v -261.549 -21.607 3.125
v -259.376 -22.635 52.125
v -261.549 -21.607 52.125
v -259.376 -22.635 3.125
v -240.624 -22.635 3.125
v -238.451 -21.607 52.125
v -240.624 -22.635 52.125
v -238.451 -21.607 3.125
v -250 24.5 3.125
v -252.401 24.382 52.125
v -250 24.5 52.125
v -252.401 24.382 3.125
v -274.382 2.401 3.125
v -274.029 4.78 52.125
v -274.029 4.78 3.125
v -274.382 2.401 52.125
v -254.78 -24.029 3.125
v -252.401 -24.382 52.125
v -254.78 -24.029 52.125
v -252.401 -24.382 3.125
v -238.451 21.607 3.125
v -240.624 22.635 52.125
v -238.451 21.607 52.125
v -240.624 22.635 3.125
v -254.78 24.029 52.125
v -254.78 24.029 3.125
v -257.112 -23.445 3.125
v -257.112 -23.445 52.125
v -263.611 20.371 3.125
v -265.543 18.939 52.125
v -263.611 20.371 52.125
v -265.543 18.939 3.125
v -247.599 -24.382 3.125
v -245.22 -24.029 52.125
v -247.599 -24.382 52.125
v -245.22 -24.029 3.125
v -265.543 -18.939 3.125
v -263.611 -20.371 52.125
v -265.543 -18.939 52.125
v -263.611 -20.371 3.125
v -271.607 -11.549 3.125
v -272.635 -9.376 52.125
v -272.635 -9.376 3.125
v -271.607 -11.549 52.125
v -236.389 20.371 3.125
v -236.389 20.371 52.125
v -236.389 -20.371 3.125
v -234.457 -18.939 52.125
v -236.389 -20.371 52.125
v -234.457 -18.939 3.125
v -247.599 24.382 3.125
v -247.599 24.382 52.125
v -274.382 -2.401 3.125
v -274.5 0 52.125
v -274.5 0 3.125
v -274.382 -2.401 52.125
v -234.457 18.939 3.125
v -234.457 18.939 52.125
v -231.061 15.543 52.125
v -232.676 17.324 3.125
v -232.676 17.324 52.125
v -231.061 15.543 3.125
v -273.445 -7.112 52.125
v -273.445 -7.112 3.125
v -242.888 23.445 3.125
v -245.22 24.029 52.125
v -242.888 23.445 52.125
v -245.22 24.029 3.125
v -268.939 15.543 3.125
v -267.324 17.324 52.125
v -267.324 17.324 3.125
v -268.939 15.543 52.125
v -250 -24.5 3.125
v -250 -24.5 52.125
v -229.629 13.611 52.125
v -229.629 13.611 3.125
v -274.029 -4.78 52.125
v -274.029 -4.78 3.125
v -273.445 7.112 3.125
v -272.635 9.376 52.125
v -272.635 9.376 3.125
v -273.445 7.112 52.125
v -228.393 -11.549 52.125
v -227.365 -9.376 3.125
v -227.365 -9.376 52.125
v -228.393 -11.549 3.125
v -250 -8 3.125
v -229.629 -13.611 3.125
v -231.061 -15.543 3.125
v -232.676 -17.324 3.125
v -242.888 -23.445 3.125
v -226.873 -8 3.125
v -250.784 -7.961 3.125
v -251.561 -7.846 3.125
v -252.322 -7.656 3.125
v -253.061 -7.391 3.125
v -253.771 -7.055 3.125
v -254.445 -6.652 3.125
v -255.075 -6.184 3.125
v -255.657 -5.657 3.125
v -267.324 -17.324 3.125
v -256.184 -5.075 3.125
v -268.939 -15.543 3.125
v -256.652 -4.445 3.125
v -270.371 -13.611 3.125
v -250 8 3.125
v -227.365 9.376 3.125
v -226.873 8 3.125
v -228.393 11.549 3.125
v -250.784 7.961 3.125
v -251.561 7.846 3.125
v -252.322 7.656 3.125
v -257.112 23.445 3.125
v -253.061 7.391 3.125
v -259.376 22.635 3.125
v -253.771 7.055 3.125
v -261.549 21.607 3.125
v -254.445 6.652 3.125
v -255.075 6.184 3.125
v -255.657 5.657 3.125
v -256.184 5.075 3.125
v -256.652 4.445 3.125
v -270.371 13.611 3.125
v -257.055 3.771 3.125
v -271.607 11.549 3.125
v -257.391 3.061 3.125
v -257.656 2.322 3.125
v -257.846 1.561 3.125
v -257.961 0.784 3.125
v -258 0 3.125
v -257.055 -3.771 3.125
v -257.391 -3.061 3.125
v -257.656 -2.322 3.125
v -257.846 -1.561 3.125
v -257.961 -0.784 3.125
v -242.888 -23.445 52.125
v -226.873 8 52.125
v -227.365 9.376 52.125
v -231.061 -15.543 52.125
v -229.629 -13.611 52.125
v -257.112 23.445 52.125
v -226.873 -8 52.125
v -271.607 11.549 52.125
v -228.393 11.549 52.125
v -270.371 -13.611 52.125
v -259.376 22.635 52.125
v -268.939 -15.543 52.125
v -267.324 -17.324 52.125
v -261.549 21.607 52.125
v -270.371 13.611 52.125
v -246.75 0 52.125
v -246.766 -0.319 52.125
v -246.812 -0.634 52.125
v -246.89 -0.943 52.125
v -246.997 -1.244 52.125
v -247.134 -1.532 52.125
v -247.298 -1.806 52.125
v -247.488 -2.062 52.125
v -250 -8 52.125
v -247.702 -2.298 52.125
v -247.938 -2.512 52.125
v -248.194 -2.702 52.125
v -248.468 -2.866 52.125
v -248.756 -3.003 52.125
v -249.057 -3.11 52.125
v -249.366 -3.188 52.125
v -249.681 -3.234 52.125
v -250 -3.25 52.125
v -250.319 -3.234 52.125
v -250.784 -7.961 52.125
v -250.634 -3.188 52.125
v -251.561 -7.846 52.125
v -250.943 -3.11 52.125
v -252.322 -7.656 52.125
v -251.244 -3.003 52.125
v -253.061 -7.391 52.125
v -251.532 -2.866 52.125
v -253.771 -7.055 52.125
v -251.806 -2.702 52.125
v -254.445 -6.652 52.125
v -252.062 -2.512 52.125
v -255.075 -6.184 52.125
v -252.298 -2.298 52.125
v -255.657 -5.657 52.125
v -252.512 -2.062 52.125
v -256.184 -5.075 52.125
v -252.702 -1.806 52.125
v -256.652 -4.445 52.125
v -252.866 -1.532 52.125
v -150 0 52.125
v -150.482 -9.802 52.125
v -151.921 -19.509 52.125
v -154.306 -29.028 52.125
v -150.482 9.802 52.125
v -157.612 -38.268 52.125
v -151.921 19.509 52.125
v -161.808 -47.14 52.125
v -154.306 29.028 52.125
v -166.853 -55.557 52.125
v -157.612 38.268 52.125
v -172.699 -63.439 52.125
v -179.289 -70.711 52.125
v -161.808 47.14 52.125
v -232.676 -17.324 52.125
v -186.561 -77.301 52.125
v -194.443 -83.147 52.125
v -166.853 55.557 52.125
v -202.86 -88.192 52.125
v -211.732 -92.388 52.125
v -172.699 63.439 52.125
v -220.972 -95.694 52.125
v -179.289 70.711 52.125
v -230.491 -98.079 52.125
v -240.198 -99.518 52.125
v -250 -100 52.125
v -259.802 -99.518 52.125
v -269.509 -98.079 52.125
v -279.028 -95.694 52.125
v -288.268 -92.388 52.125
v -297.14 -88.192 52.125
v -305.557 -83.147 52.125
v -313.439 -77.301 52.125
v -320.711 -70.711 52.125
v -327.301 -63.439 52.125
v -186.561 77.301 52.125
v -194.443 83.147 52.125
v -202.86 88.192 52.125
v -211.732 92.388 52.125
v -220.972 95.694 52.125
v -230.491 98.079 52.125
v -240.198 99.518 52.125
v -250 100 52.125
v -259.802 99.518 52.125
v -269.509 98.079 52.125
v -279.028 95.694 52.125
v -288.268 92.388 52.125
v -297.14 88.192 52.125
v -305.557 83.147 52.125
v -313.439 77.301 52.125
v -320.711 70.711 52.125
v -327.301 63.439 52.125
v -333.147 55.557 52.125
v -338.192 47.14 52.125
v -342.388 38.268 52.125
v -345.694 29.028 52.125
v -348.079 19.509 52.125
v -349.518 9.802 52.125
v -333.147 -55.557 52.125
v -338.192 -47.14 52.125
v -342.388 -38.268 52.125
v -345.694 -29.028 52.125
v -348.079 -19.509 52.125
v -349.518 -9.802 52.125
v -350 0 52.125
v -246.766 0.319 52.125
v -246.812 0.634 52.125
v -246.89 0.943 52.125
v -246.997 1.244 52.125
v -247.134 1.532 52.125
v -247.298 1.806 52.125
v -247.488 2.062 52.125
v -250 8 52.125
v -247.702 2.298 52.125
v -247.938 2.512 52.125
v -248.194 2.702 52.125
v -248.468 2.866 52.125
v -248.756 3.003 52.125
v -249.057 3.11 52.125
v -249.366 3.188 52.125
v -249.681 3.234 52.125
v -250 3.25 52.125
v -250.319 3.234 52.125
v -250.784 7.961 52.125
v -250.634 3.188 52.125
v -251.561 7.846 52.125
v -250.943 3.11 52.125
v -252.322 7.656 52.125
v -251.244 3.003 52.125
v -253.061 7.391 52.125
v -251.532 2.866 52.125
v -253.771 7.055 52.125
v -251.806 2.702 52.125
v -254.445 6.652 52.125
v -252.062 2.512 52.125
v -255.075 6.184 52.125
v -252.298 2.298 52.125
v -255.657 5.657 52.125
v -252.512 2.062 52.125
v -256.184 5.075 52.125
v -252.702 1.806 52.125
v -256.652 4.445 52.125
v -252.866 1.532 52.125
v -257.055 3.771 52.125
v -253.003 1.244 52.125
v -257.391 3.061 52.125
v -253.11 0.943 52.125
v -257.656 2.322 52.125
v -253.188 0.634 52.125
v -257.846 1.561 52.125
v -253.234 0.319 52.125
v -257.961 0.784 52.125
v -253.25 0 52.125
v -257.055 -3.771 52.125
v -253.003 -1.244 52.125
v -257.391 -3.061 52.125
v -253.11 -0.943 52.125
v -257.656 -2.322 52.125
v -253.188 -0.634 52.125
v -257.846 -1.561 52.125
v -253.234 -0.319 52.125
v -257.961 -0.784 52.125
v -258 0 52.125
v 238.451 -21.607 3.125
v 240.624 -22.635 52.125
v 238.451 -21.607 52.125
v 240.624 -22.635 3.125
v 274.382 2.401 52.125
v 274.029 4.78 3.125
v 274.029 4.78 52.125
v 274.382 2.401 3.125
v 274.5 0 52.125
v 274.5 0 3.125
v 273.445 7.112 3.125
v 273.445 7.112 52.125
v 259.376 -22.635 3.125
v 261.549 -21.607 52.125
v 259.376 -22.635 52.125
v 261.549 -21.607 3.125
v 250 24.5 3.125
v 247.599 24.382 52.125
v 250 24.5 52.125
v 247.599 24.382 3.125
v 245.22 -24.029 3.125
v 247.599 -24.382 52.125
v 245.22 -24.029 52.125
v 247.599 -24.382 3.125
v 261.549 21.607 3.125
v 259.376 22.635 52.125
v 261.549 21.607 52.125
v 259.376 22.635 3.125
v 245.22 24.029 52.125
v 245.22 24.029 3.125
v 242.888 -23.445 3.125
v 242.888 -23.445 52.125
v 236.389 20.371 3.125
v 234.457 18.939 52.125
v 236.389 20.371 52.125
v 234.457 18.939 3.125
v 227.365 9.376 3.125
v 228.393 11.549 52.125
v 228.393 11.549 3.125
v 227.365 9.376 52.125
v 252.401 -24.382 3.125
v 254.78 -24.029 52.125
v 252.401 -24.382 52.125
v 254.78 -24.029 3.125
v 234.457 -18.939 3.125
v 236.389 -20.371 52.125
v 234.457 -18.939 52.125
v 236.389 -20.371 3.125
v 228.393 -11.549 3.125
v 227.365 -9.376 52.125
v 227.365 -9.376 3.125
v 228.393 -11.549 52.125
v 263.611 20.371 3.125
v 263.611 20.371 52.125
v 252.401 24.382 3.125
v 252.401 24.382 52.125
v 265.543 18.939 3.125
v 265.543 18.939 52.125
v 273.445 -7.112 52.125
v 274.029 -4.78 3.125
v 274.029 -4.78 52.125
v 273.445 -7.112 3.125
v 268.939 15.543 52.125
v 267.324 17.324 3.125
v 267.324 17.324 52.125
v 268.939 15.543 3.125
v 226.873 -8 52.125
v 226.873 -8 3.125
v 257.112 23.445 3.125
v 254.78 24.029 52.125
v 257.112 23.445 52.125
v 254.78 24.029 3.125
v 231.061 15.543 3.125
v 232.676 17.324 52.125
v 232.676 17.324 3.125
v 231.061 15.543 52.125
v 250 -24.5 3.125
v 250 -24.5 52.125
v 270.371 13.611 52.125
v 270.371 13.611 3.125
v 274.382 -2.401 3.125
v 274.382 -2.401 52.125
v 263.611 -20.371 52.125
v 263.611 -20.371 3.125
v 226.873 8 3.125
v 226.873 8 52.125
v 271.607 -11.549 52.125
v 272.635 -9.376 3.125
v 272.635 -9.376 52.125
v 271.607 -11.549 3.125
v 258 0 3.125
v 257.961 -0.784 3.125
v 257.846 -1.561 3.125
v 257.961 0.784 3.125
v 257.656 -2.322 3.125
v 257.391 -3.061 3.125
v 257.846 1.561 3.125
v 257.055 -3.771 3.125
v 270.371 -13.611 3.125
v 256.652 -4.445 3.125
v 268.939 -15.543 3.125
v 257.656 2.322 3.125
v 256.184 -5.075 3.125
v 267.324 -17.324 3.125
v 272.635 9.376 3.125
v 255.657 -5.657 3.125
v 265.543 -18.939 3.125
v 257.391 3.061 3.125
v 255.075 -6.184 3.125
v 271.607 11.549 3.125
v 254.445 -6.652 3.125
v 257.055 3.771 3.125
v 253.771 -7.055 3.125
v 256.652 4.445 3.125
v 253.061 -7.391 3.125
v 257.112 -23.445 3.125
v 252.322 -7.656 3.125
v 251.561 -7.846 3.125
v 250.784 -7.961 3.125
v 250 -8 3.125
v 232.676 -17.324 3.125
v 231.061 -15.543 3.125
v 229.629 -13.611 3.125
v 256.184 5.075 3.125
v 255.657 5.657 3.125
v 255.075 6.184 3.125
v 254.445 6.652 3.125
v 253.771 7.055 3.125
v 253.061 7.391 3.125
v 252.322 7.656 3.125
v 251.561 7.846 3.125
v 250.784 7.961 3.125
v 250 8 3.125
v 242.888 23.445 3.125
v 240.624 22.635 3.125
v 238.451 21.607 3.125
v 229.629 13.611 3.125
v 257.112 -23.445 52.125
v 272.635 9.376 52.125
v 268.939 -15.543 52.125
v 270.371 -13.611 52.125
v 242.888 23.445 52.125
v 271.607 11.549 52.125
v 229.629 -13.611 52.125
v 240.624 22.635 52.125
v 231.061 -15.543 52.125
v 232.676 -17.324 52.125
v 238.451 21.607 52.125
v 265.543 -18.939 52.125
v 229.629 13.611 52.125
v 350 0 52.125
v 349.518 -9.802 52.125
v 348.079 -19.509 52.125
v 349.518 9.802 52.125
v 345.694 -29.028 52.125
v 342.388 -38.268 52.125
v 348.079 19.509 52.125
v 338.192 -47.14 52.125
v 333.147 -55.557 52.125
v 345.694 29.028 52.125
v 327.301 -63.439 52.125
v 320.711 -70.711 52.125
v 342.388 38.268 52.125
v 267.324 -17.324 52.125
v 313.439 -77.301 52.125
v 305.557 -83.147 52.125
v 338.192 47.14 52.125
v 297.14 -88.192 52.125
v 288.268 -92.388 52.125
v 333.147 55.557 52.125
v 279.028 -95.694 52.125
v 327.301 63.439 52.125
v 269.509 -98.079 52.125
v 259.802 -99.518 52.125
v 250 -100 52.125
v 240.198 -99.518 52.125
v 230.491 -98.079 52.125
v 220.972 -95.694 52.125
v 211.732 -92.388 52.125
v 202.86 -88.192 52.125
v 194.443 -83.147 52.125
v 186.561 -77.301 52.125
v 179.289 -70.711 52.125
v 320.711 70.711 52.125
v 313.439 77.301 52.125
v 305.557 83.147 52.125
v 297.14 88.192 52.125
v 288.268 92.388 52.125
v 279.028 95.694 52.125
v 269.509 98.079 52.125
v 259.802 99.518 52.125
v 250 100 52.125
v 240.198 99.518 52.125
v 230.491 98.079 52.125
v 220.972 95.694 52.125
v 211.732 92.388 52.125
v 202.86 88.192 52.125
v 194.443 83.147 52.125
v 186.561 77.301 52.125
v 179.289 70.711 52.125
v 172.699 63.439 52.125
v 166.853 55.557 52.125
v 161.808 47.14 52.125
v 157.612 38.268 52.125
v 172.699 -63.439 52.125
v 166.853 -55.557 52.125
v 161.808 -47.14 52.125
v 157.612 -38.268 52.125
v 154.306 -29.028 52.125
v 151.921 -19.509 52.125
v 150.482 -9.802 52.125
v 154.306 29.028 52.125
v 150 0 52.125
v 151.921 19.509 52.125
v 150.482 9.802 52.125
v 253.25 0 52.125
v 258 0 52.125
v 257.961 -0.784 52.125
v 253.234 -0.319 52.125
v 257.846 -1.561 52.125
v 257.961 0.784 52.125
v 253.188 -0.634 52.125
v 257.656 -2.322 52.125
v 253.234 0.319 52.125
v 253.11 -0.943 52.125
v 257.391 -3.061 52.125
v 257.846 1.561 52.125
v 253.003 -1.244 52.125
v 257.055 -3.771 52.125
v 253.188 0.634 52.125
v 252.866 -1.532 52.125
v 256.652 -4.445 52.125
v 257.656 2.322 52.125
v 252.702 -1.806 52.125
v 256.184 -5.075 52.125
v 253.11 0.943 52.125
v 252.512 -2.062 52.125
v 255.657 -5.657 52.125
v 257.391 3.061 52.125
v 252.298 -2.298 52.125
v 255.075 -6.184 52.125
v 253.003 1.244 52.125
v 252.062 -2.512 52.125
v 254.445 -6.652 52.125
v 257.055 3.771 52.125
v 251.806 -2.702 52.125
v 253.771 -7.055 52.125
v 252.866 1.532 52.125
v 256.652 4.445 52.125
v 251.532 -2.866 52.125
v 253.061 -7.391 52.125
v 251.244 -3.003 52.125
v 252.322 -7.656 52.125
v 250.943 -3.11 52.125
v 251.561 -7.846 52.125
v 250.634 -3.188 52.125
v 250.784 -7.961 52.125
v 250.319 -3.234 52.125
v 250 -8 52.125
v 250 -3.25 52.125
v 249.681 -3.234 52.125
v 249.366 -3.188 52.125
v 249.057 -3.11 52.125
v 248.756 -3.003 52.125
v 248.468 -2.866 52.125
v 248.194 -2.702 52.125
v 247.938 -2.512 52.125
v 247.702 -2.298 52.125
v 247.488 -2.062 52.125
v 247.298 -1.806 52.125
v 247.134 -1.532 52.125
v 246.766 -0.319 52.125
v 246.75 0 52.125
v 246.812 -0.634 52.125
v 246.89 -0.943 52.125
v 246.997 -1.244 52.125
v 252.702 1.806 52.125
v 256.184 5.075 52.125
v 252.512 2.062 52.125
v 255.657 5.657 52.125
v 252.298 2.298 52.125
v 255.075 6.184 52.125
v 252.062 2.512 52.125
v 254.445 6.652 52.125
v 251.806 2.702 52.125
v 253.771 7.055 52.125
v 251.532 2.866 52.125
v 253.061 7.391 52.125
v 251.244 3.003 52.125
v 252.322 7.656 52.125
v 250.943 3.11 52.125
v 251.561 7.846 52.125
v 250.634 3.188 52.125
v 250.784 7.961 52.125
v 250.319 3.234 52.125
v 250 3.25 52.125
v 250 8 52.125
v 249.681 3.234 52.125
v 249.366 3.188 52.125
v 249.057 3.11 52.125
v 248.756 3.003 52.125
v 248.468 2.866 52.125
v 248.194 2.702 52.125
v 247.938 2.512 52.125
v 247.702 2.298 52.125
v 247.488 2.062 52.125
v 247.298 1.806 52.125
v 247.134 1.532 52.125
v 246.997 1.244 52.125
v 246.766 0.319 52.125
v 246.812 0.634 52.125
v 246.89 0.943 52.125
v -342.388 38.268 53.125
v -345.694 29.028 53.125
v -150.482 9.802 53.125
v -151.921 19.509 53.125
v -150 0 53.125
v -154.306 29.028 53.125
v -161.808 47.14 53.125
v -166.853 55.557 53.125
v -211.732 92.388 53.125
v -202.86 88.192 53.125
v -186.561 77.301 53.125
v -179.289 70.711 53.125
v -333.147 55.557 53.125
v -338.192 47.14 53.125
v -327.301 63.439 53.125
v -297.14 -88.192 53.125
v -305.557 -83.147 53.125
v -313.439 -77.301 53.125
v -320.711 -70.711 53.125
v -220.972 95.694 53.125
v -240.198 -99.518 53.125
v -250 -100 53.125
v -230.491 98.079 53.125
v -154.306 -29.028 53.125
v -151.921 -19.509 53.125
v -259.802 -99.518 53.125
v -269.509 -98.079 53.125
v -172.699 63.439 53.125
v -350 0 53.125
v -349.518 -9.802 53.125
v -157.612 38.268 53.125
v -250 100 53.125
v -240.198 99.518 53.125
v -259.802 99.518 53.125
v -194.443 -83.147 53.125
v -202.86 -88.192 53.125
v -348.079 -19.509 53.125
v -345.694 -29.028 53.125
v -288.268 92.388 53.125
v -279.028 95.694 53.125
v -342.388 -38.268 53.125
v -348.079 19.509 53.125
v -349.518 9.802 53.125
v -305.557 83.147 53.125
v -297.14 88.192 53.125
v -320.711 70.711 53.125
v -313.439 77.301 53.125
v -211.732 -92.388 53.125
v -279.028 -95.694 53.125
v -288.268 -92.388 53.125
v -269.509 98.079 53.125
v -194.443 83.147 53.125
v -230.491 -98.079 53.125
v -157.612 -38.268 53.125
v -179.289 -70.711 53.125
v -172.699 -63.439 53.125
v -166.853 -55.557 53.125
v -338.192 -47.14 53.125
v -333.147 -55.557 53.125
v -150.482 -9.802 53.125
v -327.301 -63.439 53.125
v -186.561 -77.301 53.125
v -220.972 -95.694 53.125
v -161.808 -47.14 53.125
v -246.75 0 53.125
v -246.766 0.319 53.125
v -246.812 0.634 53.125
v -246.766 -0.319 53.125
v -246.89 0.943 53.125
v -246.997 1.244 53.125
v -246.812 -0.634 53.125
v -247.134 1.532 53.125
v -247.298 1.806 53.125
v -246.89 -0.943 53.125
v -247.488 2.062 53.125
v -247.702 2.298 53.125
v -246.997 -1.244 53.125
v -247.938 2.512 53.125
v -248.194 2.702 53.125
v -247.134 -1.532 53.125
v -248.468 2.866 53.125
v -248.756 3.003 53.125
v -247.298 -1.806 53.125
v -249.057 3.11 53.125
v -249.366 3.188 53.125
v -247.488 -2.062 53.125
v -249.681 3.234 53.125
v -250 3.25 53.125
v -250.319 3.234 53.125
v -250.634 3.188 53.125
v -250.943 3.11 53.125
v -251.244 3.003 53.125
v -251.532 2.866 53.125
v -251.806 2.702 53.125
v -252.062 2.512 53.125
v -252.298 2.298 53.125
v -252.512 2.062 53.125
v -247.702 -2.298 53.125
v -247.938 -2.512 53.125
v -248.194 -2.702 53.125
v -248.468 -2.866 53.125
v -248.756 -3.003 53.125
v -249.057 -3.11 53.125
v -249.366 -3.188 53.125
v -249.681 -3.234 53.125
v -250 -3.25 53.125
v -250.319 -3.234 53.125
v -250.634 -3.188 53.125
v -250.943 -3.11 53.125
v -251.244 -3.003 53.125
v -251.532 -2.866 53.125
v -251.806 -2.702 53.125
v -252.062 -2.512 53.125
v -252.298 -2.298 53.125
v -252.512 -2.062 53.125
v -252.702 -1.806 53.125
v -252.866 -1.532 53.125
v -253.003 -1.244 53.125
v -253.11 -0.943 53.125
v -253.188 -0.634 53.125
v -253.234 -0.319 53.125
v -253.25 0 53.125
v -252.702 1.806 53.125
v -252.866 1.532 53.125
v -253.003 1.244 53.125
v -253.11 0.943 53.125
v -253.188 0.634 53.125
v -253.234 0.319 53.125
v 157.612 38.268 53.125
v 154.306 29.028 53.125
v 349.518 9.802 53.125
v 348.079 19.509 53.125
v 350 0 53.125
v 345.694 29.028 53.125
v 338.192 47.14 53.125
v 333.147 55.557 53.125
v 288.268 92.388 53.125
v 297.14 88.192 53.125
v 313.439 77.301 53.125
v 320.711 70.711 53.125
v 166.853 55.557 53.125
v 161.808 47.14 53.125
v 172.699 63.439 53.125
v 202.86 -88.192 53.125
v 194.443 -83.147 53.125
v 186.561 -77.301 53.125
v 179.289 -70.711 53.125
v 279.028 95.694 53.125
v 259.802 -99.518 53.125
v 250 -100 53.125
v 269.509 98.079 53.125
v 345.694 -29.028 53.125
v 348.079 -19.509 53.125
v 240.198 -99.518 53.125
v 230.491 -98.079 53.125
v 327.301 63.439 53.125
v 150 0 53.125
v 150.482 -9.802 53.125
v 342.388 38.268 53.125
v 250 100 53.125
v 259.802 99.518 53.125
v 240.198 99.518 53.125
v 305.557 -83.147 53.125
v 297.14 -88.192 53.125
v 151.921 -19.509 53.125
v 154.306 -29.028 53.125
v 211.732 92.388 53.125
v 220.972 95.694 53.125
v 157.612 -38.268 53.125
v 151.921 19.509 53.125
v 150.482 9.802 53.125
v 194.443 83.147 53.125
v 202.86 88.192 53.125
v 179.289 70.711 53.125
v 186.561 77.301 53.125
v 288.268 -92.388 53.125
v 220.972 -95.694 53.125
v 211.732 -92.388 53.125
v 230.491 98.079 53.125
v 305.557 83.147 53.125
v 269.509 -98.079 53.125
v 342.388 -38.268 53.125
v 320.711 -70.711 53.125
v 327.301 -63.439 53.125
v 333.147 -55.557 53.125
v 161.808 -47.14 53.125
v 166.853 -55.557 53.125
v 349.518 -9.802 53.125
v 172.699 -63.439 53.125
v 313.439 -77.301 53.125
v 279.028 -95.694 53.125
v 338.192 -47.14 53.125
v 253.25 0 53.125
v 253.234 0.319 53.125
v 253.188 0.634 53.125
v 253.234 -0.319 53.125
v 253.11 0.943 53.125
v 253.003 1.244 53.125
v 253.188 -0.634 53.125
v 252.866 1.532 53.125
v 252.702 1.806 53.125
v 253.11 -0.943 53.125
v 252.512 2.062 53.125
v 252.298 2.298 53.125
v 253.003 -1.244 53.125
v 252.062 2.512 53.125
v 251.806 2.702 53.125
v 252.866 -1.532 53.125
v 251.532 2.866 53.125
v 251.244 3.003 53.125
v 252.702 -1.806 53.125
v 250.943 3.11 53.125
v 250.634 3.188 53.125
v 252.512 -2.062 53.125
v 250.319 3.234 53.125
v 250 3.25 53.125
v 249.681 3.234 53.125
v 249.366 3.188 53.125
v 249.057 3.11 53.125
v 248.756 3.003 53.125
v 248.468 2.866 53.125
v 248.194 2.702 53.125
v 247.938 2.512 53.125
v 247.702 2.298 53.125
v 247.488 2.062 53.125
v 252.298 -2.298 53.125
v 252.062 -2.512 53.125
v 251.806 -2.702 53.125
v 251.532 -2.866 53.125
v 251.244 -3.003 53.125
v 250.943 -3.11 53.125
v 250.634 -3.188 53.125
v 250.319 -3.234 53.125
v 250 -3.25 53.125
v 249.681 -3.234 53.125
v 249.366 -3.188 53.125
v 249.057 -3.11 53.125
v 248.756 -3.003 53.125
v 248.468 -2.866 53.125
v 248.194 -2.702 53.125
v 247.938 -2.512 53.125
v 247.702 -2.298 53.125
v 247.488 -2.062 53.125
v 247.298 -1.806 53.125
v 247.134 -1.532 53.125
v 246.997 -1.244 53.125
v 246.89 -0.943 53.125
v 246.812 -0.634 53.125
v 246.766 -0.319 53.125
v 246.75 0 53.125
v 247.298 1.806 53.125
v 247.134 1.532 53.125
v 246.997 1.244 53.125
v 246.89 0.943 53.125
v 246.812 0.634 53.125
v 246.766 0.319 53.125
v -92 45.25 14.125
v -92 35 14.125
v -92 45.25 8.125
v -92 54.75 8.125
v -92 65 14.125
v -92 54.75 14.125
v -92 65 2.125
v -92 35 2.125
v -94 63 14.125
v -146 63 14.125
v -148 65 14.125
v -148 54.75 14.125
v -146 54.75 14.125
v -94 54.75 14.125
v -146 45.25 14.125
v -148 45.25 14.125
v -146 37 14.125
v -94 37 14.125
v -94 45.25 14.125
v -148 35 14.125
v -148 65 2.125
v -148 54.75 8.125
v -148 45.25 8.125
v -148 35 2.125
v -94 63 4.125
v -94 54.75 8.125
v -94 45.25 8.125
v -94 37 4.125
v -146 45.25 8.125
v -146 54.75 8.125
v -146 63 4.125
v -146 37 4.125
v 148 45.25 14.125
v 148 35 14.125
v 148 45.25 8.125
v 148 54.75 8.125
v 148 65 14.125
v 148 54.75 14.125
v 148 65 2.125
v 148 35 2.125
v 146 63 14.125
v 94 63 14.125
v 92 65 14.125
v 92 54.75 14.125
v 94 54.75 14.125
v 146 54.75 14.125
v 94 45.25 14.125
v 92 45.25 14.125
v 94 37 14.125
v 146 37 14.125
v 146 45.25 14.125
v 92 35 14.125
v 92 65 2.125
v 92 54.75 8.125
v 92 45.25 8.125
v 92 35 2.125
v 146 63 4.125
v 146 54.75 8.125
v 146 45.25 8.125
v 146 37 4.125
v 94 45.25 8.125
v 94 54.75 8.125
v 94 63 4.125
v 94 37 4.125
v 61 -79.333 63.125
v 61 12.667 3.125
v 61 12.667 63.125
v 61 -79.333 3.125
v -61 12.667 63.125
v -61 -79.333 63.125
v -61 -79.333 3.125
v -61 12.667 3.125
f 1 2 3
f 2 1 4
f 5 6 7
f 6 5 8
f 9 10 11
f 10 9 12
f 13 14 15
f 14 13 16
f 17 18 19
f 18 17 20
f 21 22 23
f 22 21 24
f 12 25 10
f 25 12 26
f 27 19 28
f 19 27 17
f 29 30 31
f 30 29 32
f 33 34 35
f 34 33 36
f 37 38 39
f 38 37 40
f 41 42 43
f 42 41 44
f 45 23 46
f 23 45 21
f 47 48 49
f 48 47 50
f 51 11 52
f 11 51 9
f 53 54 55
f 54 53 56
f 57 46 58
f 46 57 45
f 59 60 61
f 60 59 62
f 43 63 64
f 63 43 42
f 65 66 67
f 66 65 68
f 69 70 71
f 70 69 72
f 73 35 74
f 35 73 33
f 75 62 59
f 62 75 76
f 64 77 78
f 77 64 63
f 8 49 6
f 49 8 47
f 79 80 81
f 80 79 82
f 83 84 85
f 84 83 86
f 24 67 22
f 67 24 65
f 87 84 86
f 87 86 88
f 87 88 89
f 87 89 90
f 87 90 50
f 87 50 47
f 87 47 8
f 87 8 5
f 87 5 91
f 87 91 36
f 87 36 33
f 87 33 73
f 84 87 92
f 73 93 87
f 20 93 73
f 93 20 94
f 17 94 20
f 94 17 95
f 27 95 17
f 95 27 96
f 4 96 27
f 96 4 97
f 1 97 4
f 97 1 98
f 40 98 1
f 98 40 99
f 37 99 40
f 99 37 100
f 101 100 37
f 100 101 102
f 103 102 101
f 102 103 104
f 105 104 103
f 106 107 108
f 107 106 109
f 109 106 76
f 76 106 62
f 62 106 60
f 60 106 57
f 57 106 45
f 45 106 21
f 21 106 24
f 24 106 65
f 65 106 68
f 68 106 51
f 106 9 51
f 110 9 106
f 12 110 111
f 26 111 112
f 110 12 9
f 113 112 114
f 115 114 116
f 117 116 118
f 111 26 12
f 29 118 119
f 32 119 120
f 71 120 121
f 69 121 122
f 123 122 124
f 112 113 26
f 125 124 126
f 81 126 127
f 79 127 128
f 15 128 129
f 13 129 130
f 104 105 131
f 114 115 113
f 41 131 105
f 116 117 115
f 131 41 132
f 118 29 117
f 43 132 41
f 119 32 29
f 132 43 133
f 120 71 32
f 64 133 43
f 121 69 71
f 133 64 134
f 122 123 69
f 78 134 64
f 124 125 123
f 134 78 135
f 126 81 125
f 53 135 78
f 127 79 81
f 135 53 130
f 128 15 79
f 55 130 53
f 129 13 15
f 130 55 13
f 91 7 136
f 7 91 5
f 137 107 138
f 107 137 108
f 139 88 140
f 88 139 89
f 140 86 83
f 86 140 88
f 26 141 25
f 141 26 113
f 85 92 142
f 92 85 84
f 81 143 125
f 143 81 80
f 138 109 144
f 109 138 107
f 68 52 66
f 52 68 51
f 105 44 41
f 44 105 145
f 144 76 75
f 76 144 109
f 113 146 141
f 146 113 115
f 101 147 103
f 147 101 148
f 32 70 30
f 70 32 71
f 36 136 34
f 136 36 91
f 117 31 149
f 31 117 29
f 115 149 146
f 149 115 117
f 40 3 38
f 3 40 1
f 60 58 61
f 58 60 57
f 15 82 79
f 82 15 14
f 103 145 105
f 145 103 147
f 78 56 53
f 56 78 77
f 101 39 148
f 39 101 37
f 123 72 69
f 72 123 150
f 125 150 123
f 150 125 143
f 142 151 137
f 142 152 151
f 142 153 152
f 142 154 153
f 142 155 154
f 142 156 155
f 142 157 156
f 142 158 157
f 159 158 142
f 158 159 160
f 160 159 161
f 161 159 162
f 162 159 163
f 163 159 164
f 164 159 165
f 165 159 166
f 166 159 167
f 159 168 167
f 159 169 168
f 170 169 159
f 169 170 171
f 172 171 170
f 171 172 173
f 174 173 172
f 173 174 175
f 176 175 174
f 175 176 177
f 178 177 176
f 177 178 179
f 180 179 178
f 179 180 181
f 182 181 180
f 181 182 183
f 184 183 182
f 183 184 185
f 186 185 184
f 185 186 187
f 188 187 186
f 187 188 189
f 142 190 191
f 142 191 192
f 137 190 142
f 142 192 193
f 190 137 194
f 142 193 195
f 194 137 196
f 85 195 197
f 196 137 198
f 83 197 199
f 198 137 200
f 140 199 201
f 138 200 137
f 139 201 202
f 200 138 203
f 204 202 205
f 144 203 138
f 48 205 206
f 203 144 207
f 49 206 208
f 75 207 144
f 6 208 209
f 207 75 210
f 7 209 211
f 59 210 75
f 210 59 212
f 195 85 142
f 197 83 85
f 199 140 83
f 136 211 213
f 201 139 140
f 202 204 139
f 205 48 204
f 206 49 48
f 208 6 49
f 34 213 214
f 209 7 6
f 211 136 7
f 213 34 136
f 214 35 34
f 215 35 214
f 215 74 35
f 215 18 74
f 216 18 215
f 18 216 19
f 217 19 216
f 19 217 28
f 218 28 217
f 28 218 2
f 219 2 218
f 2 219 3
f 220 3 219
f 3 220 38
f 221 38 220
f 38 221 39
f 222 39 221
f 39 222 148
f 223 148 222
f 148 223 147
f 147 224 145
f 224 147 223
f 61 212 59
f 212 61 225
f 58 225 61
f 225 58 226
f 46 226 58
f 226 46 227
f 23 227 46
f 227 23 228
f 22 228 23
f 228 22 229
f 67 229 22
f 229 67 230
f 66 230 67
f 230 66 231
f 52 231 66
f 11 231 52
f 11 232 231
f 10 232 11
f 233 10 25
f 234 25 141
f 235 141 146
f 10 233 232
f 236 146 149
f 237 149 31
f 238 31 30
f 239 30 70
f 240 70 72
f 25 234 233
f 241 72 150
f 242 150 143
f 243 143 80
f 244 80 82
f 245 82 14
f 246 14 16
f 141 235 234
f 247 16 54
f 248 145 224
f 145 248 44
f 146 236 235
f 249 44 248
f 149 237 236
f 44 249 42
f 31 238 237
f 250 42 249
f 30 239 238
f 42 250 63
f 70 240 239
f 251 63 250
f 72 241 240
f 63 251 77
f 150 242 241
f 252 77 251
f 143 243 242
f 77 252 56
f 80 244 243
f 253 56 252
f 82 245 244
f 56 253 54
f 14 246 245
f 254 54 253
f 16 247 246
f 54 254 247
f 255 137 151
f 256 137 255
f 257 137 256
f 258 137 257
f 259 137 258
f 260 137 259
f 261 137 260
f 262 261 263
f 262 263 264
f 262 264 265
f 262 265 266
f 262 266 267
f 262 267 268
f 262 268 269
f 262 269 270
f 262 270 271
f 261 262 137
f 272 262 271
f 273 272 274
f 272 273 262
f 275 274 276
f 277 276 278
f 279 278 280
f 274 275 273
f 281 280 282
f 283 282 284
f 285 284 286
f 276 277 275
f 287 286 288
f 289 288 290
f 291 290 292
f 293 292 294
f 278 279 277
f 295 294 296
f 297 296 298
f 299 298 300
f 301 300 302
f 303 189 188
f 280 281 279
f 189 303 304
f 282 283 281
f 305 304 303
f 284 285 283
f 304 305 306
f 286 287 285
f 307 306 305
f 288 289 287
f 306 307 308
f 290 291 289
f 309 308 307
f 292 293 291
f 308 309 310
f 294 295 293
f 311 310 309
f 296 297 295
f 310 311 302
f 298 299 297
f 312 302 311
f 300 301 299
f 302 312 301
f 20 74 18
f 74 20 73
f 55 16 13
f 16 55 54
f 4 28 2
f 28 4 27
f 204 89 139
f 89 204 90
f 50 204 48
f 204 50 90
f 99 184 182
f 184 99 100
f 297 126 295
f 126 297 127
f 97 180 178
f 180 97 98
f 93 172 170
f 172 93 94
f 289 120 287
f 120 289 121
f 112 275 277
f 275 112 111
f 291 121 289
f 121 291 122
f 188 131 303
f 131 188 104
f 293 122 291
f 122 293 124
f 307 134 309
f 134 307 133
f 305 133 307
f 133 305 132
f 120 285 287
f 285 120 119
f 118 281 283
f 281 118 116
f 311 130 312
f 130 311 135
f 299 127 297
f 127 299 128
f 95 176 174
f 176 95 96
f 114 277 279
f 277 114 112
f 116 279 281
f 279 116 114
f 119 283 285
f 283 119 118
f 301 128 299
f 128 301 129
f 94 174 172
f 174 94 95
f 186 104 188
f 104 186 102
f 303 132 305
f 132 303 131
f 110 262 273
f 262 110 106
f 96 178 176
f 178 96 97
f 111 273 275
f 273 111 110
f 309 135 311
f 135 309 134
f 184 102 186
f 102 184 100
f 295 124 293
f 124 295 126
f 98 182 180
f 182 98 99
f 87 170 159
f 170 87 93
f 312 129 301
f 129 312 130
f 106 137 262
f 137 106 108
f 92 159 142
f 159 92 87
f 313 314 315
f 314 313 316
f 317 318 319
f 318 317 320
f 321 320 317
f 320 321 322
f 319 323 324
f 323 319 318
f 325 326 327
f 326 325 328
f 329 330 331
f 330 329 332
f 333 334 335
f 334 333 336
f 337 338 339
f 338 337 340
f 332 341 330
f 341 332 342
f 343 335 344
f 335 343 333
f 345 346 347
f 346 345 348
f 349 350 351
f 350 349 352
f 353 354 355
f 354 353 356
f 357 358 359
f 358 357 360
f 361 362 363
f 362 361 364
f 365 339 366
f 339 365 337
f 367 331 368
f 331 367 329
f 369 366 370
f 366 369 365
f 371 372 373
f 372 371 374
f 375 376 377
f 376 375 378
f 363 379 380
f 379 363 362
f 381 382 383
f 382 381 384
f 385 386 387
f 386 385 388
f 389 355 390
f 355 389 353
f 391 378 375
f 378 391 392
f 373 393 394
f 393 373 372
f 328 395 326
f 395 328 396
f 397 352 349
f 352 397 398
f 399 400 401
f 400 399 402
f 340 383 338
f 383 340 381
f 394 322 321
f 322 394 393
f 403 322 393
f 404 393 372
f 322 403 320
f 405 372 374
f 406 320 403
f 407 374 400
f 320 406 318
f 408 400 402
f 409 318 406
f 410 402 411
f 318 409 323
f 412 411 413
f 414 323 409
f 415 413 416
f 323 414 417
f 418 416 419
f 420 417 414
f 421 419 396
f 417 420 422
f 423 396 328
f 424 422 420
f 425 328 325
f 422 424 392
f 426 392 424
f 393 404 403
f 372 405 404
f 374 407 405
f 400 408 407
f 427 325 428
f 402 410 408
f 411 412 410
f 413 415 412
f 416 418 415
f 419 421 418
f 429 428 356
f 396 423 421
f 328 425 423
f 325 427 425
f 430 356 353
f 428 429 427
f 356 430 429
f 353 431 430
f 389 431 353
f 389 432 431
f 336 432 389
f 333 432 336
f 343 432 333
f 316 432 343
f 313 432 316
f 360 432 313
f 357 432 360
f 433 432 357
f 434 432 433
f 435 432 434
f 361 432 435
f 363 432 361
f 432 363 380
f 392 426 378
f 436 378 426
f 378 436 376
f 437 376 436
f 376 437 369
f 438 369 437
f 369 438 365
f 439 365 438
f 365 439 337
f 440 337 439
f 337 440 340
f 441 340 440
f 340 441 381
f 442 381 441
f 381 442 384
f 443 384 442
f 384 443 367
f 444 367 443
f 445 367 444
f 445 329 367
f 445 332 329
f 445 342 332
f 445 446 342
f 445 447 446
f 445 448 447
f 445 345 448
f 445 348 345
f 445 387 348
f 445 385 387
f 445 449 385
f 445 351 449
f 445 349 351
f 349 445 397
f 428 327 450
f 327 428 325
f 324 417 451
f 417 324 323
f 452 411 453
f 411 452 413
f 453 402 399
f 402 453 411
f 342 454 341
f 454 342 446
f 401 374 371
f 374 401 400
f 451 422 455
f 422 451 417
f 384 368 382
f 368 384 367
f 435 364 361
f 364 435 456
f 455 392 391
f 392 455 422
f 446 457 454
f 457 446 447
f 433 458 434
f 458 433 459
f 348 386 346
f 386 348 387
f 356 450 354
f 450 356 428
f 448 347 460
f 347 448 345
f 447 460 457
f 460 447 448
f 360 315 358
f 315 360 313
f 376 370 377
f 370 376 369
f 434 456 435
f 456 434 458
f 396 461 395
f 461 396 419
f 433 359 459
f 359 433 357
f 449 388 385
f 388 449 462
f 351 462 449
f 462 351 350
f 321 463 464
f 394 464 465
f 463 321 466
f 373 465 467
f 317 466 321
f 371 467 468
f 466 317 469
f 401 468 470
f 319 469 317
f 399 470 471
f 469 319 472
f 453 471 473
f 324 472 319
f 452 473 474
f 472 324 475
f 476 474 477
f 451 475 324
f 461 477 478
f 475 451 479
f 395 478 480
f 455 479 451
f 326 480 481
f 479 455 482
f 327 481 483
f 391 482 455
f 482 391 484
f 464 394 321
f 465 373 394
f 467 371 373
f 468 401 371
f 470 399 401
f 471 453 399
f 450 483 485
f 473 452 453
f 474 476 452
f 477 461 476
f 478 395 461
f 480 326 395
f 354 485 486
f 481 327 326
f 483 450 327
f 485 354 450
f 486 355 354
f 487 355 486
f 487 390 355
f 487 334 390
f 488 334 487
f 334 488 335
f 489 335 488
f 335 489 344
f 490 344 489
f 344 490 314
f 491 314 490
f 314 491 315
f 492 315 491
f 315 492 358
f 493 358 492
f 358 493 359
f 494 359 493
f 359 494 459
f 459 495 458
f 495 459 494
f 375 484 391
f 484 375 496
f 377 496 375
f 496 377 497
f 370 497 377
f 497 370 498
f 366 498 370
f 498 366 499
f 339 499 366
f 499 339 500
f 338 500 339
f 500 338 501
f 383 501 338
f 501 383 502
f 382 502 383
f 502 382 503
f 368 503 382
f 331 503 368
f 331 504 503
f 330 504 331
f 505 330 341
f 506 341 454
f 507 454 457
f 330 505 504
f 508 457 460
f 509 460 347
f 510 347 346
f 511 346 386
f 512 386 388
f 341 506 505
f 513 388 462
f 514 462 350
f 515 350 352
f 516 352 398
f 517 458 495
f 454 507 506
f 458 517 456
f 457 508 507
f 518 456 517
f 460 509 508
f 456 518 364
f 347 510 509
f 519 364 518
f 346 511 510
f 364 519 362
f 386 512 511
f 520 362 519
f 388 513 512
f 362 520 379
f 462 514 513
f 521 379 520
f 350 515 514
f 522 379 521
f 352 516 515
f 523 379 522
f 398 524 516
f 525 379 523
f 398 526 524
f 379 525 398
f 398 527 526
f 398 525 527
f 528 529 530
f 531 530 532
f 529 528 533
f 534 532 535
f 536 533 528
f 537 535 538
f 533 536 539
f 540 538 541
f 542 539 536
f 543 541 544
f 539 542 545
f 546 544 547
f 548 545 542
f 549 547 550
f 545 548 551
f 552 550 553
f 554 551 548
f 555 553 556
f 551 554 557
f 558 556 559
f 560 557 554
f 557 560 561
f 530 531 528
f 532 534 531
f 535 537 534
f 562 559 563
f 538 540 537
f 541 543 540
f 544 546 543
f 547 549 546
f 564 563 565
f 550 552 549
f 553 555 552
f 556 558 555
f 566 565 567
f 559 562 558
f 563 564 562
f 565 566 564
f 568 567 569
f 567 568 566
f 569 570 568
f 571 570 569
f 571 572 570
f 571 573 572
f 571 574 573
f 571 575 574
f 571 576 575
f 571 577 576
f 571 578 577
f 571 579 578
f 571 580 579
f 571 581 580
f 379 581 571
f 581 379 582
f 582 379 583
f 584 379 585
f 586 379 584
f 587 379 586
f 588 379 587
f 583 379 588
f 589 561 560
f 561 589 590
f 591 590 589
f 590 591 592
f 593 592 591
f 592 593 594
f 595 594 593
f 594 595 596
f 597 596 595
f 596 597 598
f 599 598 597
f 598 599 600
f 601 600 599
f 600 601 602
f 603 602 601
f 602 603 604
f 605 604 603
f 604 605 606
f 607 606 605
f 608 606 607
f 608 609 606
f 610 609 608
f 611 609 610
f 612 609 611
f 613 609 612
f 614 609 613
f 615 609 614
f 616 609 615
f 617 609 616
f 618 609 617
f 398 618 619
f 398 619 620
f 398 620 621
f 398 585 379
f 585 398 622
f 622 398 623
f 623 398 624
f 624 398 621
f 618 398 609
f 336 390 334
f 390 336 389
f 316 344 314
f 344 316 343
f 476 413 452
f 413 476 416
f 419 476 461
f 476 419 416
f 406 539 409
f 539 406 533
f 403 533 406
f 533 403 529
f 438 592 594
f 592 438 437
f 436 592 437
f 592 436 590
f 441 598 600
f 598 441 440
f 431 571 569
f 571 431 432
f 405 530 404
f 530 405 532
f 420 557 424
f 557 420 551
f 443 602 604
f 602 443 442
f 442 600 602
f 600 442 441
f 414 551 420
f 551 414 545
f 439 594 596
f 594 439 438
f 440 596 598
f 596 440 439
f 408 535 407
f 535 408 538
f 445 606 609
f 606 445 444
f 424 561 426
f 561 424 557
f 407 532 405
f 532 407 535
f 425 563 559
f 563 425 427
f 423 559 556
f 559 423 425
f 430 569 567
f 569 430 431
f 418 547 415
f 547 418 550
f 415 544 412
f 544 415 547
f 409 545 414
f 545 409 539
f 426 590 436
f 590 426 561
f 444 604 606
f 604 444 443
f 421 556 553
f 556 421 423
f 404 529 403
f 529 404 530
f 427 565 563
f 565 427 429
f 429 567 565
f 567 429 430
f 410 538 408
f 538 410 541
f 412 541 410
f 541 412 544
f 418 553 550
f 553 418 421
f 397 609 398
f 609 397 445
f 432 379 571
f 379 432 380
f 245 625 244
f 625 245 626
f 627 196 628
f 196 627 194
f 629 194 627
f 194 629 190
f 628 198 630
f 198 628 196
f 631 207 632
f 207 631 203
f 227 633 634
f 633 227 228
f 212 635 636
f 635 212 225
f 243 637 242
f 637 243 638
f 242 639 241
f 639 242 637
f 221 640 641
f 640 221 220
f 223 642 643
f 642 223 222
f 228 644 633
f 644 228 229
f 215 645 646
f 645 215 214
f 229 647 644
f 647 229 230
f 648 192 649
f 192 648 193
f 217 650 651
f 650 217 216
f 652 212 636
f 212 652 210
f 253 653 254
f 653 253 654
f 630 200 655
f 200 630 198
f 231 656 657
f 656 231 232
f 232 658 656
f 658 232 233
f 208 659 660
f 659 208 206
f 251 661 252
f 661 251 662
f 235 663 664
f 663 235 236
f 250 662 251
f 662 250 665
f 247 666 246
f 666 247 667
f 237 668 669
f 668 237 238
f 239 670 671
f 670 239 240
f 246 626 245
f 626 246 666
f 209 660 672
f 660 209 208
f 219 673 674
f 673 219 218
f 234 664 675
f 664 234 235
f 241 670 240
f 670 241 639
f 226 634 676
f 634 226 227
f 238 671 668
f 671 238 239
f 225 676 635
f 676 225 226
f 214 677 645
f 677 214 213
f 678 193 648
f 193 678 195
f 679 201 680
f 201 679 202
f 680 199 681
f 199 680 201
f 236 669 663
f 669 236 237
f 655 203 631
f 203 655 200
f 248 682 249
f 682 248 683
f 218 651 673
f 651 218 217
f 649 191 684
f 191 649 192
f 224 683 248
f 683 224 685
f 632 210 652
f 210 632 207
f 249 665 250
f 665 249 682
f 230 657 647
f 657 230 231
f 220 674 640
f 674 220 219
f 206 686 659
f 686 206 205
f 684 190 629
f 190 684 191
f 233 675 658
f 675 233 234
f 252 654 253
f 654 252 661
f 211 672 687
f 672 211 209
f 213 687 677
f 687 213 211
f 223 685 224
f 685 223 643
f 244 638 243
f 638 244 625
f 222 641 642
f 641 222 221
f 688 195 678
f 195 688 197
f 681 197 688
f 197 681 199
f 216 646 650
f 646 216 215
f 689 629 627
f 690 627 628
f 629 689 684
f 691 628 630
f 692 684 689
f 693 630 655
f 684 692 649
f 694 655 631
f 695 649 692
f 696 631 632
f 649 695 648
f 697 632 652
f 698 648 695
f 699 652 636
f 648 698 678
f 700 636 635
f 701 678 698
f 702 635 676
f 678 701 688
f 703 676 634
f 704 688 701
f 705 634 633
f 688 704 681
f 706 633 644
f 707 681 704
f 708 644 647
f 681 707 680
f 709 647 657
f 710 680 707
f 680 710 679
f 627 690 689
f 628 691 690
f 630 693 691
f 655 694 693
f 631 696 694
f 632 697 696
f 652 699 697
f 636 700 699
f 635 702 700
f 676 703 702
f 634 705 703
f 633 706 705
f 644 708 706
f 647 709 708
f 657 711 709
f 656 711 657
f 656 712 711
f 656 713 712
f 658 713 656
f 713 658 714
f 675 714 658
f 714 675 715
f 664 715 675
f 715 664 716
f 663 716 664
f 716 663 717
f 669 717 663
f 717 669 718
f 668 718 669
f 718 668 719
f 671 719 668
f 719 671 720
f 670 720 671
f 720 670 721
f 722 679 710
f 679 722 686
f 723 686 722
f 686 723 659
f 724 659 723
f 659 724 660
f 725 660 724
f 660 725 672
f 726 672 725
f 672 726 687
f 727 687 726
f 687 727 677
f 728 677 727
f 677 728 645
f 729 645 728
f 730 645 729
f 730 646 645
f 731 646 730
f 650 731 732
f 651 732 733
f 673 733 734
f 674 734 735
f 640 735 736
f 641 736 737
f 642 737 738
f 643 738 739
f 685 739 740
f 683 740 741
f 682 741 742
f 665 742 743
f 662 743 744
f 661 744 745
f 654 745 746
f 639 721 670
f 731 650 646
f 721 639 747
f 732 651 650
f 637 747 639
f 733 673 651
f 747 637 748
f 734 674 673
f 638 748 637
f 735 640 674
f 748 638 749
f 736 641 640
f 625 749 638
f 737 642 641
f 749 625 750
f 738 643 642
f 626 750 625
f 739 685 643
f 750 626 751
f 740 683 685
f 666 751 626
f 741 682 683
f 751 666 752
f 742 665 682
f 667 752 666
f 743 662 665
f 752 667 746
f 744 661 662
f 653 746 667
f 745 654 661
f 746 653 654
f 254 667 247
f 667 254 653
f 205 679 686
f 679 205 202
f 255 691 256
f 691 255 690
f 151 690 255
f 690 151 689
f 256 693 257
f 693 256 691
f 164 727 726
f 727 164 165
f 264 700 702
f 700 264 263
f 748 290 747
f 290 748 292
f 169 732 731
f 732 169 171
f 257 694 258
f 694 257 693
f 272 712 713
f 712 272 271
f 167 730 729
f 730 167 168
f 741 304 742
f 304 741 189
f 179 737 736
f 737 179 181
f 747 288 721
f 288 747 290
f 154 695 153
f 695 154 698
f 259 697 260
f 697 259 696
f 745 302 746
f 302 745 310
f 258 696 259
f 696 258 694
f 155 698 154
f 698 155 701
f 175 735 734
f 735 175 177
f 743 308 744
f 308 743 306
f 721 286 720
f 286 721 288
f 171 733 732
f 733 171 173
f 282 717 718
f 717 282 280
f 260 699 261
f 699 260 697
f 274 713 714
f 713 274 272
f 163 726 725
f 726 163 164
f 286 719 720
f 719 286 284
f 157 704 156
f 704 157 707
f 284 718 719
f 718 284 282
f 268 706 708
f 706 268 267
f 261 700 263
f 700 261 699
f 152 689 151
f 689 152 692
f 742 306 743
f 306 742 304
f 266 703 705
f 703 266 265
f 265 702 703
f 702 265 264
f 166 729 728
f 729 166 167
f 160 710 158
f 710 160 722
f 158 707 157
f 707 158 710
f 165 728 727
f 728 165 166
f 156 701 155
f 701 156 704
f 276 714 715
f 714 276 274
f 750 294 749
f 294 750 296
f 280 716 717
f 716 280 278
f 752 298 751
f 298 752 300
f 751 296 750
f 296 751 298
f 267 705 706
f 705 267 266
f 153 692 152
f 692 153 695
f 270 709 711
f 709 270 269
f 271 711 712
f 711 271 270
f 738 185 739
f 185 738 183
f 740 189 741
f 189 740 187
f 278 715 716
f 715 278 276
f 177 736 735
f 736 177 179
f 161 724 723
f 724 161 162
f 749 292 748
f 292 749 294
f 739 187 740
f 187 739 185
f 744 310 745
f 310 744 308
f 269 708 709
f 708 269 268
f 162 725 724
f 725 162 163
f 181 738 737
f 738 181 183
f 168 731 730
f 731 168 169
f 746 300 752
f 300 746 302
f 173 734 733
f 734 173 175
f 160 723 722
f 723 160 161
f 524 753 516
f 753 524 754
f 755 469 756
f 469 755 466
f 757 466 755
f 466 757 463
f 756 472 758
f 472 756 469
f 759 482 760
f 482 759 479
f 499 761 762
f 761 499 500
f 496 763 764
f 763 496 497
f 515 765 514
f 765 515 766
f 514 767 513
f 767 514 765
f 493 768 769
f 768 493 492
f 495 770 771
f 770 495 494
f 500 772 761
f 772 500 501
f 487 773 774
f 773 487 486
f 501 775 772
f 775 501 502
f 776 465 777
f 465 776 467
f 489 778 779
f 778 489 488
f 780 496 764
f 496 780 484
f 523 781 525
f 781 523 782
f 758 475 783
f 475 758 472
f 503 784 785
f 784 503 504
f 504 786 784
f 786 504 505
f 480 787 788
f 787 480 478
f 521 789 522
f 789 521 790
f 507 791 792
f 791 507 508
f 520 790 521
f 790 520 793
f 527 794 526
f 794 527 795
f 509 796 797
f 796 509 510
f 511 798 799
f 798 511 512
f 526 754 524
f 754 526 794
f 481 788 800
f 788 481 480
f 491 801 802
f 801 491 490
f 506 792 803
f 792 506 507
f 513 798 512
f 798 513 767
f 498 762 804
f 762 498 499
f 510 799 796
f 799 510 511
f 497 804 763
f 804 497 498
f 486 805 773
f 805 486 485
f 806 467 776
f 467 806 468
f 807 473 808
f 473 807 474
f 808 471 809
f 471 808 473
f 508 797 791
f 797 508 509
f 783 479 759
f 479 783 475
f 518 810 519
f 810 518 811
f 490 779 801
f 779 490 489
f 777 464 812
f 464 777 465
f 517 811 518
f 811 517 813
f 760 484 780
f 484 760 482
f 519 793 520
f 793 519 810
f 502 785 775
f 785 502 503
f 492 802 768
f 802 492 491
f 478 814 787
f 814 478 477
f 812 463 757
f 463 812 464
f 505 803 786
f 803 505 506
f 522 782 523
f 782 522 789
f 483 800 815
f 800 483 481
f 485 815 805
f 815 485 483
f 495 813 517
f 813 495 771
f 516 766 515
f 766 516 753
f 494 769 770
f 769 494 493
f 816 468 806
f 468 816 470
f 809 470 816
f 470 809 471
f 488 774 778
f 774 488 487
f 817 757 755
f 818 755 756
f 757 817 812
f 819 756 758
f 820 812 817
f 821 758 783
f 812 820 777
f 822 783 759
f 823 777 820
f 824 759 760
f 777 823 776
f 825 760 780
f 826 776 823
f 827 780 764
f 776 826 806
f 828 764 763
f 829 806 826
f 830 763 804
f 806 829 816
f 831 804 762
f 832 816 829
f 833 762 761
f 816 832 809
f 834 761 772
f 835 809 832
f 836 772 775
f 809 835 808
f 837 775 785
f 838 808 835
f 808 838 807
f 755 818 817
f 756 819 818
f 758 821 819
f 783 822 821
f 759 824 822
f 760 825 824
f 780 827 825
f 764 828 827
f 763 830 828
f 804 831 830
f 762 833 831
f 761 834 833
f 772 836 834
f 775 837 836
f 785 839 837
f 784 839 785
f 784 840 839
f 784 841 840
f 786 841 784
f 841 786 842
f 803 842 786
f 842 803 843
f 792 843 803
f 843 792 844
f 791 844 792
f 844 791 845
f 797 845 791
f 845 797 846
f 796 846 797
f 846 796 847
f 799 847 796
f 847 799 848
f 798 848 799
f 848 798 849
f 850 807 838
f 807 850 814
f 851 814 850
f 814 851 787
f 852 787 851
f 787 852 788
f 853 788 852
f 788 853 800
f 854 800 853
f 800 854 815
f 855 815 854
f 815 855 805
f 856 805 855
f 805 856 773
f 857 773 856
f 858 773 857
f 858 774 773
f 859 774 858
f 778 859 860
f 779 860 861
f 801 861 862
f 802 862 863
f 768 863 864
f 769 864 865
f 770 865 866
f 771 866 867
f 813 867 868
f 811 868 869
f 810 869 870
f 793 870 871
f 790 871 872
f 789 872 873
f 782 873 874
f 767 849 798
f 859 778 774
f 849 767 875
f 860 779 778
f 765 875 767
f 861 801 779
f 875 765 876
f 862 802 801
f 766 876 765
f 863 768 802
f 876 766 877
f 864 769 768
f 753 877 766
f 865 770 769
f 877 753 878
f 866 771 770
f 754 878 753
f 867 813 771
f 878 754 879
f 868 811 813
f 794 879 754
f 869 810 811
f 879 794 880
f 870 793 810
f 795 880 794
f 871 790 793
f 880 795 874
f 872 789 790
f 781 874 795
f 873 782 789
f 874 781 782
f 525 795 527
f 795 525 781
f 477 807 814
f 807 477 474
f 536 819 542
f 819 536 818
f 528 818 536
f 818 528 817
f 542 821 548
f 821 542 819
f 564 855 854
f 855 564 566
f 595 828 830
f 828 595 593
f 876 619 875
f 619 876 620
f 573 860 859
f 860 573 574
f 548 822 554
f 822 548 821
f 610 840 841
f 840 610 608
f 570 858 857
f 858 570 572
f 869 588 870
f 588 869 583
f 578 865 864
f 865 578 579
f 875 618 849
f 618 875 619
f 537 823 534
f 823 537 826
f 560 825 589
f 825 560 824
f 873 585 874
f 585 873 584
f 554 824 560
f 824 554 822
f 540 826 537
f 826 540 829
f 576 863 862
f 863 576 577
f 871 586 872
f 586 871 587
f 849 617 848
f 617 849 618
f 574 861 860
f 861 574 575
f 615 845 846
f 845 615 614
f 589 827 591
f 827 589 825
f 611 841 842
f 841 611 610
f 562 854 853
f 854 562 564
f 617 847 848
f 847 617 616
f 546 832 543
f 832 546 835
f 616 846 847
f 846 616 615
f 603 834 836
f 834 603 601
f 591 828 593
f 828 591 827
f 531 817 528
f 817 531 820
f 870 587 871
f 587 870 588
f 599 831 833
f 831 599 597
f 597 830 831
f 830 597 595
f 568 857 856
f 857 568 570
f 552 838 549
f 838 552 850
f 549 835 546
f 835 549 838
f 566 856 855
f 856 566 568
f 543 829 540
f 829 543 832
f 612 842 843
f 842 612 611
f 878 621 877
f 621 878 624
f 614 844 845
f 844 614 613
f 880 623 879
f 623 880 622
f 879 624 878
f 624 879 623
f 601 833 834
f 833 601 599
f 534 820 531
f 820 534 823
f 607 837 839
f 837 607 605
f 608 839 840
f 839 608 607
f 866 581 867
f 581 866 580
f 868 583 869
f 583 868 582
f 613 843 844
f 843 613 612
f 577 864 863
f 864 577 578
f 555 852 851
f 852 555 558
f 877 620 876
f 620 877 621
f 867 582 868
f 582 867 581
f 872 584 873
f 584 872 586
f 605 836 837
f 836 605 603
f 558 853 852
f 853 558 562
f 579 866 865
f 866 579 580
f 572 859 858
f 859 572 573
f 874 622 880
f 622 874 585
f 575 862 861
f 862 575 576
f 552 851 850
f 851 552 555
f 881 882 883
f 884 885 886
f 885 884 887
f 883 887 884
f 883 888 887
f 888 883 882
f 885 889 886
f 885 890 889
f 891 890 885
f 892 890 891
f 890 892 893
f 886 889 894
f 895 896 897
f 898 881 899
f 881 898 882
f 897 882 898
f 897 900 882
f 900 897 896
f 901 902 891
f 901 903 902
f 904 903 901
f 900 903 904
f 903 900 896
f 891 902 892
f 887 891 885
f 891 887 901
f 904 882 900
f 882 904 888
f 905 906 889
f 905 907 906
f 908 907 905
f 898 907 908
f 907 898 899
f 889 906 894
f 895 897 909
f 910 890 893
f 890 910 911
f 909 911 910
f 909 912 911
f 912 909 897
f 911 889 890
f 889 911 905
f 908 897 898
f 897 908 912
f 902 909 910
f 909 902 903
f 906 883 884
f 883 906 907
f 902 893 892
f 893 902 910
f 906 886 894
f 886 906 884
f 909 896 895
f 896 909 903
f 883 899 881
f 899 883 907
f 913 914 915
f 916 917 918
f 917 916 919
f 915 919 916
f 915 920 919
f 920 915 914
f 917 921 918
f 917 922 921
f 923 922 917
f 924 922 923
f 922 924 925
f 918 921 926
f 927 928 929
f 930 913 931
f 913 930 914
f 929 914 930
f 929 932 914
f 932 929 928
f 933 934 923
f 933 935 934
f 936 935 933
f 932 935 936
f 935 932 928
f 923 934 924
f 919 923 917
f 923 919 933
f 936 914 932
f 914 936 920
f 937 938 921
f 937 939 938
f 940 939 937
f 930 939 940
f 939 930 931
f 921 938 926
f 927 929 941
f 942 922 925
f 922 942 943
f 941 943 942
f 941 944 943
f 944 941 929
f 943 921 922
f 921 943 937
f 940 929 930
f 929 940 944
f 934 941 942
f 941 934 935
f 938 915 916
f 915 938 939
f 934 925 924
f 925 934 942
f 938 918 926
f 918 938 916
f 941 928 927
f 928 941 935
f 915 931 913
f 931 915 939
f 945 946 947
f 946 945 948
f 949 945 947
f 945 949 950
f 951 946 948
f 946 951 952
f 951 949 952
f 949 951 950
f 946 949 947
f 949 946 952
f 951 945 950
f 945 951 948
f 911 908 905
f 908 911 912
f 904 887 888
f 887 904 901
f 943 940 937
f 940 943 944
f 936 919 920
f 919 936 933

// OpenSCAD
// Sending Stones Model Railroad Layout
// ------------------------------------
// Abraxas3d
// units are in mm


// ------------------------------------
// Parameters
// ------------------------------------

//make curves nice
$fn = 64;

// base layer dimensions
base_width = 700;
base_depth = 200;
base_height = 6.25; // quarter inch acrylic sheet

// X728 box dimensions (approximate)
x728_width = 122;
x728_depth = 92;
x728_height = 60;
    
// Ground plane and donut stand dimensions
ground_plane_radius = 100; //~quarter wave ground plane
ground_plane_height = 1; // 1 mm aluminum plate
donut_height = 2*24.5; //one inch height increments
donut_radius = 24.5; //one inch radius
donut_hole_radius = 8; // 16 mm clearance for SMA bulkhead connector in donut
sma_hole_radius = 6.5/2; // 6.5 mm hole for SMA connector

// Heltec v3 case dimensions
heltec_width = 56;
heltec_depth = 30;
heltec_height = 11;
heltec_wall = 2;
usb_width = 9.5;
usb_height = 4;
usb_sill = 5;

// ------------------------------------
// Components Defined
// ------------------------------------

// the base layer
//cube([base_width, base_depth , base_height], center = true);

// X728
translate([0, -base_depth/6, base_height/2 + x728_height/2])
    {
    cube([x728_width, x728_depth, x728_height], center = true);
    };

// Ground plane donut hole mounts with cable cutout
translate([-250, 0, base_height/2 + donut_height/2])
    {
    difference()
        {
        cylinder(donut_height, donut_radius, donut_radius, center = true); //donut
        cylinder(donut_height, donut_hole_radius, donut_hole_radius, center = true); //hole
        translate([donut_radius/2, 0, 0])
            {
            cube([donut_radius, donut_hole_radius*2, donut_height], center = true); //channel out
            };
        };
    };
    
translate([250, 0, base_height/2 + donut_height/2])
    {
    difference()
        {
        cylinder(donut_height, donut_radius, donut_radius, center = true);
        cylinder(donut_height, donut_hole_radius, donut_hole_radius, center = true);
        translate([-donut_radius/2, 0, 0])
            {
            cube([donut_radius, donut_hole_radius*2, donut_height], center = true);
            };
        };
    };

// Ground planes with SMA bulkhead holes
translate([-250, 0, base_height/2 + donut_height + ground_plane_height/2])
    {
   difference()
        {
        cylinder(ground_plane_height, ground_plane_radius, ground_plane_radius, center = true);
        cylinder(ground_plane_height, sma_hole_radius, sma_hole_radius, center = true);
        };
    };
    
translate([250, 0, base_height/2 + donut_height + ground_plane_height/2])
    {
    difference()
        {
        cylinder(ground_plane_height, ground_plane_radius, ground_plane_radius, center = true);
        cylinder(ground_plane_height, sma_hole_radius, sma_hole_radius, center = true);
        }
    };

// Heltec v3 holders

translate([-120, base_depth/4, base_height/2])
    {
    cube([heltec_width, heltec_depth, heltec_wall], center = true); //base
    }


translate([-120, base_depth/4, base_height/2 + heltec_height/2])
    {
    difference()
        {
        cube([heltec_width, heltec_depth, heltec_height], center = true); // case
        cube([heltec_width - 2*heltec_wall, heltec_depth - 2*heltec_wall, heltec_height], center = true); // interior case
        
        //translate([0,0,-(heltec_height/2) + heltec_wall + usb_sill])
        translate([0,0,-(heltec_height/2) + heltec_wall + usb_sill + usb_height/2])
        {
        cube([heltec_width + 4*heltec_wall, usb_width, 2*usb_height], center = true); // holes
        }
        }
    };
 

translate([120, base_depth/4, base_height/2])
    {
    cube([heltec_width, heltec_depth, heltec_wall], center = true); //base
    }


translate([120, base_depth/4, base_height/2 + heltec_height/2])
    {
    difference()
        {
        cube([heltec_width, heltec_depth, heltec_height], center = true); // case
        cube([heltec_width - 2*heltec_wall, heltec_depth - 2*heltec_wall, heltec_height], center = true); // interior case
        
        translate([0,0,-(heltec_height/2) + heltec_wall + usb_sill + usb_height/2])
        {
        cube([heltec_width + 4*heltec_wall, usb_width, 2*usb_height], center = true); // holes
        }
        }
    };
